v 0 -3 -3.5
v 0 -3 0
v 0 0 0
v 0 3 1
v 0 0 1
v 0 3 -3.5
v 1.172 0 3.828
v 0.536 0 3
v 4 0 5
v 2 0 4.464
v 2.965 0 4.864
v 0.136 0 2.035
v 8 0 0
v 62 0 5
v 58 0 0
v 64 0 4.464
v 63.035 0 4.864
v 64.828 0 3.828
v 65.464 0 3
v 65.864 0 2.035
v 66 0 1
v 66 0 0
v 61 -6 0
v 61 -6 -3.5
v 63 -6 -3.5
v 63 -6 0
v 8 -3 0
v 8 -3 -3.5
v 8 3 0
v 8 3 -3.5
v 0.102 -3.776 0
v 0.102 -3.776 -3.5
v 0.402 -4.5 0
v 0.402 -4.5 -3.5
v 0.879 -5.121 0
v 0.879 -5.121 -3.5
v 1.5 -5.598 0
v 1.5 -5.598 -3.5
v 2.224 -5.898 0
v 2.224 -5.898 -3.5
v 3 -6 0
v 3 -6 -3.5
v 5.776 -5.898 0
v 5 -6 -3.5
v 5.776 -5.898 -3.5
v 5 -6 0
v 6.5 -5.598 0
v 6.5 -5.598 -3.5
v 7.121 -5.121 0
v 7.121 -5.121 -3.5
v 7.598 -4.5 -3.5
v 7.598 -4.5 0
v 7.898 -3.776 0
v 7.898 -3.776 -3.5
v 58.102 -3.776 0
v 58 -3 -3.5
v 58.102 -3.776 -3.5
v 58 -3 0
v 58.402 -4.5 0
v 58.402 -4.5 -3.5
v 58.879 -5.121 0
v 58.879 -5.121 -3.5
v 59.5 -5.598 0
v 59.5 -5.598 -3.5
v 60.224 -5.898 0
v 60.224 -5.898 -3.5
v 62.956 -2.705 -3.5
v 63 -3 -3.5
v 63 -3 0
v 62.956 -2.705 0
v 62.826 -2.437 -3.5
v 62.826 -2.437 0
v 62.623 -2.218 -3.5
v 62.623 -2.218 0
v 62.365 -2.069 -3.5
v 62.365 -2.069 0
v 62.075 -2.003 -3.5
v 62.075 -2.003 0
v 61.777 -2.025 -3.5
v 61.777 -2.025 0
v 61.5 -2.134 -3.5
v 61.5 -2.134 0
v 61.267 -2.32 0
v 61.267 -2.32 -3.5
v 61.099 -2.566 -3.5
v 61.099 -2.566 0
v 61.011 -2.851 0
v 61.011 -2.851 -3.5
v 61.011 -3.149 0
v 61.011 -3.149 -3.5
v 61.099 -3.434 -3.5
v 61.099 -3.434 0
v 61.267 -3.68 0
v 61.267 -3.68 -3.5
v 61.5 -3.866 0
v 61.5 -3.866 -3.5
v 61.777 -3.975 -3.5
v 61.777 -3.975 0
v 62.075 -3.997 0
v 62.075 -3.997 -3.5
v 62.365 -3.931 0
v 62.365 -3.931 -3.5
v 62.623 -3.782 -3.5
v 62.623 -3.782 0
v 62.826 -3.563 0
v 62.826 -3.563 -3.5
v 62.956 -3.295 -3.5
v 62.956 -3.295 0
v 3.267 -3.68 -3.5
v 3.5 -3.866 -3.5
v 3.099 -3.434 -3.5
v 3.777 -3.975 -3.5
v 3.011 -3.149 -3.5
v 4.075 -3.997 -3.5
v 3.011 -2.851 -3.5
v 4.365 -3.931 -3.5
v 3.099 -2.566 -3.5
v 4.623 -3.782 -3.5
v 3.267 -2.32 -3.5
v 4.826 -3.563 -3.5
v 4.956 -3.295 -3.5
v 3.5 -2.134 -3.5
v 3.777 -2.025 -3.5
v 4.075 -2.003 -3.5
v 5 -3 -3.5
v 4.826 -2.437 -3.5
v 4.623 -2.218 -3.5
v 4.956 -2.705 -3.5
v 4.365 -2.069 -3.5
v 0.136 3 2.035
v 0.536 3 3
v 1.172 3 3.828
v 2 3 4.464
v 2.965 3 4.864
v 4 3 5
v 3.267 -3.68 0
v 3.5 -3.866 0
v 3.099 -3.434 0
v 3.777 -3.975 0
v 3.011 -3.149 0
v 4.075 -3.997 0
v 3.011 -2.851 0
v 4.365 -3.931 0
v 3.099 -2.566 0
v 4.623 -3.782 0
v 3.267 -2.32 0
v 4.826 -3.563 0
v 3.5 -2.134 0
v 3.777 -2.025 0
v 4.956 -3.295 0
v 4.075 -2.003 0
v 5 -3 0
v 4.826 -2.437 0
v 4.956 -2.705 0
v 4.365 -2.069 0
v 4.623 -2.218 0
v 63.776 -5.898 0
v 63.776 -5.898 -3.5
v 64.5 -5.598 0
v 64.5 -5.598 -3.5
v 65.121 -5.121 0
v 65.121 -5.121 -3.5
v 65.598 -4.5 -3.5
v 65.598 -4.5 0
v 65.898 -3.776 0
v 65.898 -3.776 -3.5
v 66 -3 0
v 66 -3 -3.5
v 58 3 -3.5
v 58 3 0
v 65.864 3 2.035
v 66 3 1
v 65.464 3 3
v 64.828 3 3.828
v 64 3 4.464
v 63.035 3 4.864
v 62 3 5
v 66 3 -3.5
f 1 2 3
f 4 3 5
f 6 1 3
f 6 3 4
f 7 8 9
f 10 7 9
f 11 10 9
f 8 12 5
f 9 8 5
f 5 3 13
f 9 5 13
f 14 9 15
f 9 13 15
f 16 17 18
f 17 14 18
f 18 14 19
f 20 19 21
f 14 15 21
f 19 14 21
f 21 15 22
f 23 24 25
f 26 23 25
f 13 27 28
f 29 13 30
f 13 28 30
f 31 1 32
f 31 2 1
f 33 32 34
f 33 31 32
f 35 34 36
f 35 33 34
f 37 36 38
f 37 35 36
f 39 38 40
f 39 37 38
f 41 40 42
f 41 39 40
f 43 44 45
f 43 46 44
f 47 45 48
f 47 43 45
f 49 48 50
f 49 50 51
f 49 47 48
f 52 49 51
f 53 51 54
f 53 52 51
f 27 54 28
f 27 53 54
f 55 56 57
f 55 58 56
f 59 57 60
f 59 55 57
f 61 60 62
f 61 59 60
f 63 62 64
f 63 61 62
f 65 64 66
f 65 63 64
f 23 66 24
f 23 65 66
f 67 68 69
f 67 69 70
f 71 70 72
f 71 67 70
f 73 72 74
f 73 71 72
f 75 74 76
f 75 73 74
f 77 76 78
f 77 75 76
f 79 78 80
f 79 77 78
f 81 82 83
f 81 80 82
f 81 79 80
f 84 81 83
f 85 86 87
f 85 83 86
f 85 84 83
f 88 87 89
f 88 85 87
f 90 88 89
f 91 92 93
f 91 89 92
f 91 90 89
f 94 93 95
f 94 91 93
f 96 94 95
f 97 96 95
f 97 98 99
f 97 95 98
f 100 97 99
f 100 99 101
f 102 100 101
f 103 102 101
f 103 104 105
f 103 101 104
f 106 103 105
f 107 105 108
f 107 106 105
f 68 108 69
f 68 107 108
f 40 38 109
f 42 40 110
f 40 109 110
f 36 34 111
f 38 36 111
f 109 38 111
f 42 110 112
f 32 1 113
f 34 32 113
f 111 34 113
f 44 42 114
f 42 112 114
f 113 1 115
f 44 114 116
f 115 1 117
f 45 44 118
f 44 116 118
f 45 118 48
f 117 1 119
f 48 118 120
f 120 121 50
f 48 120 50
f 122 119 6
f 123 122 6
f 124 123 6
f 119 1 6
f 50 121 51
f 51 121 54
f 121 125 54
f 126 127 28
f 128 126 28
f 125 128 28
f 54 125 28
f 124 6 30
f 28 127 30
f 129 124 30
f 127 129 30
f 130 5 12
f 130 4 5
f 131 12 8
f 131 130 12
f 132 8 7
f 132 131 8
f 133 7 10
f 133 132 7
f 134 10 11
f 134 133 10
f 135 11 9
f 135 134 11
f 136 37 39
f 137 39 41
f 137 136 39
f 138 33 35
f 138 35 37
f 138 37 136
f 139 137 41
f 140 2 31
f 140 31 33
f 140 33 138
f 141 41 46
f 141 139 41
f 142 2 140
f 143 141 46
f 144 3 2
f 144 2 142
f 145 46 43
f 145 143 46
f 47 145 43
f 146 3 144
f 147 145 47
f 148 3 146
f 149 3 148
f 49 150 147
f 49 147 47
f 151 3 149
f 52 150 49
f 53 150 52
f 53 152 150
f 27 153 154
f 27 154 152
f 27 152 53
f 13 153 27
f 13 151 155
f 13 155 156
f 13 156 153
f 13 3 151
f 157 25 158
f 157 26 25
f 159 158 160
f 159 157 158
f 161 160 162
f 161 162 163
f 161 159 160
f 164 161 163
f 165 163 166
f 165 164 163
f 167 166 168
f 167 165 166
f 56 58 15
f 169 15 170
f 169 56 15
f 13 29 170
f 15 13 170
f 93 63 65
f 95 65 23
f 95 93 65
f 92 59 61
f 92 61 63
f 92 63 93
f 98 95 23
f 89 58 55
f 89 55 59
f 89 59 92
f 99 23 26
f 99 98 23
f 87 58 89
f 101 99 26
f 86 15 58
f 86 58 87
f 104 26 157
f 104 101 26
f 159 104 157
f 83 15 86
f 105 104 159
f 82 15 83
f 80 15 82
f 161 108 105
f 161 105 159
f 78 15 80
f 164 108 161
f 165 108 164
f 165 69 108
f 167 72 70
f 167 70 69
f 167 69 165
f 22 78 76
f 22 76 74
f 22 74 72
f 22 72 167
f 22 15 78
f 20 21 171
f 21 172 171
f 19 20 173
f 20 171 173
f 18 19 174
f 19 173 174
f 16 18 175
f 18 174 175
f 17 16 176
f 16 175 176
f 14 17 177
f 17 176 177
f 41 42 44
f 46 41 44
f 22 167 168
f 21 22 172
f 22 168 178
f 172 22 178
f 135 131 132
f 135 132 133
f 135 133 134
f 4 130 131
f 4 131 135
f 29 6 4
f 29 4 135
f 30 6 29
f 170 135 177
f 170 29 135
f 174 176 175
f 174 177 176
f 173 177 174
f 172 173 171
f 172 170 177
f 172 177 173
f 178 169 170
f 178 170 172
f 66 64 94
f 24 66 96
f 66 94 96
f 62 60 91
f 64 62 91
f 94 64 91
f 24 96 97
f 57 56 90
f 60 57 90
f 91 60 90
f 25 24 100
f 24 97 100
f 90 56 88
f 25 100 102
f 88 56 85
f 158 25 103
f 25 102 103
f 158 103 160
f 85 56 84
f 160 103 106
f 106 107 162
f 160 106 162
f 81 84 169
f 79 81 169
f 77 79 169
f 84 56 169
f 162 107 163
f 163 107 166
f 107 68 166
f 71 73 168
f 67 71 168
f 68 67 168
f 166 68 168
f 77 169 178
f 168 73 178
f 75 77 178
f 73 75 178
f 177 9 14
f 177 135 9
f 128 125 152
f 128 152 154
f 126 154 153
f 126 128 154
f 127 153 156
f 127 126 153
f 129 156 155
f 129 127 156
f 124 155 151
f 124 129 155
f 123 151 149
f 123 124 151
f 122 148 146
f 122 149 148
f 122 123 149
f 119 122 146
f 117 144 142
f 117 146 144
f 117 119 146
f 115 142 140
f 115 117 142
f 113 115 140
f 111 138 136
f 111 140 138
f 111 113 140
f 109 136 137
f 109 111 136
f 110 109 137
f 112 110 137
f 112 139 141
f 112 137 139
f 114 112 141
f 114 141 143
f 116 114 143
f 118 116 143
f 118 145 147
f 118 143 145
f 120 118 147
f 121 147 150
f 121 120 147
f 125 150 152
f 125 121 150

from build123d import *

# Parameters (mm, degrees)
BOX012_W          = 66
BOX012_H          = 3
BOX012_DEPTH      = 5
FILLET003_R       = 4
CYLINDER014_R     = 1
CYLINDER014_DEPTH = 10
BOX013_W          = 8
BOX013_H          = 9
BOX013_DEPTH      = 3.5
FILLET002_R       = 3
ARRAY011_X_COUNT  = 2
ARRAY011_X_PITCH  = 58


with BuildPart() as long_cube_fillet:
    # Box012 → Box012 (new body)
    with BuildSketch(Plane.XY):
        with Locations((33, 1.5)):
            Rectangle(BOX012_W, BOX012_H)
    extrude(amount=BOX012_DEPTH)

    # Fillet003
    fillet003_edges = [long_cube_fillet.edges().sort_by_distance(p)[0] for p in [
        (0, 1.5, 5),
        (66, 1.5, 5),
    ]]
    fillet(fillet003_edges, radius=FILLET003_R)


with BuildPart() as cylinder002:
    # Cylinder014 → Cylinder014 (new body)
    with BuildSketch(Plane(origin=(4, 3, -5), x_dir=(1, 0, 0), z_dir=(0, 0, 1))):
        Circle(CYLINDER014_R)
    extrude(amount=CYLINDER014_DEPTH)


with BuildPart() as botton_holder_fusion:
    # Box013 → Box013 (new body)
    with BuildSketch(Plane.XY.offset(-3.5)):
        with Locations((4, 4.5)):
            Rectangle(BOX013_W, BOX013_H)
    extrude(amount=BOX013_DEPTH)

    # Fillet002
    fillet002_edges = [botton_holder_fusion.edges().sort_by_distance(p)[0] for p in [
        (0, 0, -1.75),
        (8, 0, -1.75),
    ]]
    fillet(fillet002_edges, radius=FILLET002_R)

    # Cut008: cut Cylinder002
    add(cylinder002.part, mode=Mode.SUBTRACT)

    # Array011 X: botton holder fusion ×2


with BuildPart() as botton_holder_fusion_1:
    add(botton_holder_fusion.part)
    with Locations(*[(i * ARRAY011_X_PITCH, 0, 0) for i in range(1, ARRAY011_X_COUNT)]):
        add(botton_holder_fusion.part)


with BuildPart() as botton_holder_fusion_2:
    # Array011 placement: moved
    add(botton_holder_fusion_1.part.moved(Location((0, -6, 0))))

    # Fusion007: union long cube fillet
    add(long_cube_fillet.part)


solid = botton_holder_fusion_2.part
